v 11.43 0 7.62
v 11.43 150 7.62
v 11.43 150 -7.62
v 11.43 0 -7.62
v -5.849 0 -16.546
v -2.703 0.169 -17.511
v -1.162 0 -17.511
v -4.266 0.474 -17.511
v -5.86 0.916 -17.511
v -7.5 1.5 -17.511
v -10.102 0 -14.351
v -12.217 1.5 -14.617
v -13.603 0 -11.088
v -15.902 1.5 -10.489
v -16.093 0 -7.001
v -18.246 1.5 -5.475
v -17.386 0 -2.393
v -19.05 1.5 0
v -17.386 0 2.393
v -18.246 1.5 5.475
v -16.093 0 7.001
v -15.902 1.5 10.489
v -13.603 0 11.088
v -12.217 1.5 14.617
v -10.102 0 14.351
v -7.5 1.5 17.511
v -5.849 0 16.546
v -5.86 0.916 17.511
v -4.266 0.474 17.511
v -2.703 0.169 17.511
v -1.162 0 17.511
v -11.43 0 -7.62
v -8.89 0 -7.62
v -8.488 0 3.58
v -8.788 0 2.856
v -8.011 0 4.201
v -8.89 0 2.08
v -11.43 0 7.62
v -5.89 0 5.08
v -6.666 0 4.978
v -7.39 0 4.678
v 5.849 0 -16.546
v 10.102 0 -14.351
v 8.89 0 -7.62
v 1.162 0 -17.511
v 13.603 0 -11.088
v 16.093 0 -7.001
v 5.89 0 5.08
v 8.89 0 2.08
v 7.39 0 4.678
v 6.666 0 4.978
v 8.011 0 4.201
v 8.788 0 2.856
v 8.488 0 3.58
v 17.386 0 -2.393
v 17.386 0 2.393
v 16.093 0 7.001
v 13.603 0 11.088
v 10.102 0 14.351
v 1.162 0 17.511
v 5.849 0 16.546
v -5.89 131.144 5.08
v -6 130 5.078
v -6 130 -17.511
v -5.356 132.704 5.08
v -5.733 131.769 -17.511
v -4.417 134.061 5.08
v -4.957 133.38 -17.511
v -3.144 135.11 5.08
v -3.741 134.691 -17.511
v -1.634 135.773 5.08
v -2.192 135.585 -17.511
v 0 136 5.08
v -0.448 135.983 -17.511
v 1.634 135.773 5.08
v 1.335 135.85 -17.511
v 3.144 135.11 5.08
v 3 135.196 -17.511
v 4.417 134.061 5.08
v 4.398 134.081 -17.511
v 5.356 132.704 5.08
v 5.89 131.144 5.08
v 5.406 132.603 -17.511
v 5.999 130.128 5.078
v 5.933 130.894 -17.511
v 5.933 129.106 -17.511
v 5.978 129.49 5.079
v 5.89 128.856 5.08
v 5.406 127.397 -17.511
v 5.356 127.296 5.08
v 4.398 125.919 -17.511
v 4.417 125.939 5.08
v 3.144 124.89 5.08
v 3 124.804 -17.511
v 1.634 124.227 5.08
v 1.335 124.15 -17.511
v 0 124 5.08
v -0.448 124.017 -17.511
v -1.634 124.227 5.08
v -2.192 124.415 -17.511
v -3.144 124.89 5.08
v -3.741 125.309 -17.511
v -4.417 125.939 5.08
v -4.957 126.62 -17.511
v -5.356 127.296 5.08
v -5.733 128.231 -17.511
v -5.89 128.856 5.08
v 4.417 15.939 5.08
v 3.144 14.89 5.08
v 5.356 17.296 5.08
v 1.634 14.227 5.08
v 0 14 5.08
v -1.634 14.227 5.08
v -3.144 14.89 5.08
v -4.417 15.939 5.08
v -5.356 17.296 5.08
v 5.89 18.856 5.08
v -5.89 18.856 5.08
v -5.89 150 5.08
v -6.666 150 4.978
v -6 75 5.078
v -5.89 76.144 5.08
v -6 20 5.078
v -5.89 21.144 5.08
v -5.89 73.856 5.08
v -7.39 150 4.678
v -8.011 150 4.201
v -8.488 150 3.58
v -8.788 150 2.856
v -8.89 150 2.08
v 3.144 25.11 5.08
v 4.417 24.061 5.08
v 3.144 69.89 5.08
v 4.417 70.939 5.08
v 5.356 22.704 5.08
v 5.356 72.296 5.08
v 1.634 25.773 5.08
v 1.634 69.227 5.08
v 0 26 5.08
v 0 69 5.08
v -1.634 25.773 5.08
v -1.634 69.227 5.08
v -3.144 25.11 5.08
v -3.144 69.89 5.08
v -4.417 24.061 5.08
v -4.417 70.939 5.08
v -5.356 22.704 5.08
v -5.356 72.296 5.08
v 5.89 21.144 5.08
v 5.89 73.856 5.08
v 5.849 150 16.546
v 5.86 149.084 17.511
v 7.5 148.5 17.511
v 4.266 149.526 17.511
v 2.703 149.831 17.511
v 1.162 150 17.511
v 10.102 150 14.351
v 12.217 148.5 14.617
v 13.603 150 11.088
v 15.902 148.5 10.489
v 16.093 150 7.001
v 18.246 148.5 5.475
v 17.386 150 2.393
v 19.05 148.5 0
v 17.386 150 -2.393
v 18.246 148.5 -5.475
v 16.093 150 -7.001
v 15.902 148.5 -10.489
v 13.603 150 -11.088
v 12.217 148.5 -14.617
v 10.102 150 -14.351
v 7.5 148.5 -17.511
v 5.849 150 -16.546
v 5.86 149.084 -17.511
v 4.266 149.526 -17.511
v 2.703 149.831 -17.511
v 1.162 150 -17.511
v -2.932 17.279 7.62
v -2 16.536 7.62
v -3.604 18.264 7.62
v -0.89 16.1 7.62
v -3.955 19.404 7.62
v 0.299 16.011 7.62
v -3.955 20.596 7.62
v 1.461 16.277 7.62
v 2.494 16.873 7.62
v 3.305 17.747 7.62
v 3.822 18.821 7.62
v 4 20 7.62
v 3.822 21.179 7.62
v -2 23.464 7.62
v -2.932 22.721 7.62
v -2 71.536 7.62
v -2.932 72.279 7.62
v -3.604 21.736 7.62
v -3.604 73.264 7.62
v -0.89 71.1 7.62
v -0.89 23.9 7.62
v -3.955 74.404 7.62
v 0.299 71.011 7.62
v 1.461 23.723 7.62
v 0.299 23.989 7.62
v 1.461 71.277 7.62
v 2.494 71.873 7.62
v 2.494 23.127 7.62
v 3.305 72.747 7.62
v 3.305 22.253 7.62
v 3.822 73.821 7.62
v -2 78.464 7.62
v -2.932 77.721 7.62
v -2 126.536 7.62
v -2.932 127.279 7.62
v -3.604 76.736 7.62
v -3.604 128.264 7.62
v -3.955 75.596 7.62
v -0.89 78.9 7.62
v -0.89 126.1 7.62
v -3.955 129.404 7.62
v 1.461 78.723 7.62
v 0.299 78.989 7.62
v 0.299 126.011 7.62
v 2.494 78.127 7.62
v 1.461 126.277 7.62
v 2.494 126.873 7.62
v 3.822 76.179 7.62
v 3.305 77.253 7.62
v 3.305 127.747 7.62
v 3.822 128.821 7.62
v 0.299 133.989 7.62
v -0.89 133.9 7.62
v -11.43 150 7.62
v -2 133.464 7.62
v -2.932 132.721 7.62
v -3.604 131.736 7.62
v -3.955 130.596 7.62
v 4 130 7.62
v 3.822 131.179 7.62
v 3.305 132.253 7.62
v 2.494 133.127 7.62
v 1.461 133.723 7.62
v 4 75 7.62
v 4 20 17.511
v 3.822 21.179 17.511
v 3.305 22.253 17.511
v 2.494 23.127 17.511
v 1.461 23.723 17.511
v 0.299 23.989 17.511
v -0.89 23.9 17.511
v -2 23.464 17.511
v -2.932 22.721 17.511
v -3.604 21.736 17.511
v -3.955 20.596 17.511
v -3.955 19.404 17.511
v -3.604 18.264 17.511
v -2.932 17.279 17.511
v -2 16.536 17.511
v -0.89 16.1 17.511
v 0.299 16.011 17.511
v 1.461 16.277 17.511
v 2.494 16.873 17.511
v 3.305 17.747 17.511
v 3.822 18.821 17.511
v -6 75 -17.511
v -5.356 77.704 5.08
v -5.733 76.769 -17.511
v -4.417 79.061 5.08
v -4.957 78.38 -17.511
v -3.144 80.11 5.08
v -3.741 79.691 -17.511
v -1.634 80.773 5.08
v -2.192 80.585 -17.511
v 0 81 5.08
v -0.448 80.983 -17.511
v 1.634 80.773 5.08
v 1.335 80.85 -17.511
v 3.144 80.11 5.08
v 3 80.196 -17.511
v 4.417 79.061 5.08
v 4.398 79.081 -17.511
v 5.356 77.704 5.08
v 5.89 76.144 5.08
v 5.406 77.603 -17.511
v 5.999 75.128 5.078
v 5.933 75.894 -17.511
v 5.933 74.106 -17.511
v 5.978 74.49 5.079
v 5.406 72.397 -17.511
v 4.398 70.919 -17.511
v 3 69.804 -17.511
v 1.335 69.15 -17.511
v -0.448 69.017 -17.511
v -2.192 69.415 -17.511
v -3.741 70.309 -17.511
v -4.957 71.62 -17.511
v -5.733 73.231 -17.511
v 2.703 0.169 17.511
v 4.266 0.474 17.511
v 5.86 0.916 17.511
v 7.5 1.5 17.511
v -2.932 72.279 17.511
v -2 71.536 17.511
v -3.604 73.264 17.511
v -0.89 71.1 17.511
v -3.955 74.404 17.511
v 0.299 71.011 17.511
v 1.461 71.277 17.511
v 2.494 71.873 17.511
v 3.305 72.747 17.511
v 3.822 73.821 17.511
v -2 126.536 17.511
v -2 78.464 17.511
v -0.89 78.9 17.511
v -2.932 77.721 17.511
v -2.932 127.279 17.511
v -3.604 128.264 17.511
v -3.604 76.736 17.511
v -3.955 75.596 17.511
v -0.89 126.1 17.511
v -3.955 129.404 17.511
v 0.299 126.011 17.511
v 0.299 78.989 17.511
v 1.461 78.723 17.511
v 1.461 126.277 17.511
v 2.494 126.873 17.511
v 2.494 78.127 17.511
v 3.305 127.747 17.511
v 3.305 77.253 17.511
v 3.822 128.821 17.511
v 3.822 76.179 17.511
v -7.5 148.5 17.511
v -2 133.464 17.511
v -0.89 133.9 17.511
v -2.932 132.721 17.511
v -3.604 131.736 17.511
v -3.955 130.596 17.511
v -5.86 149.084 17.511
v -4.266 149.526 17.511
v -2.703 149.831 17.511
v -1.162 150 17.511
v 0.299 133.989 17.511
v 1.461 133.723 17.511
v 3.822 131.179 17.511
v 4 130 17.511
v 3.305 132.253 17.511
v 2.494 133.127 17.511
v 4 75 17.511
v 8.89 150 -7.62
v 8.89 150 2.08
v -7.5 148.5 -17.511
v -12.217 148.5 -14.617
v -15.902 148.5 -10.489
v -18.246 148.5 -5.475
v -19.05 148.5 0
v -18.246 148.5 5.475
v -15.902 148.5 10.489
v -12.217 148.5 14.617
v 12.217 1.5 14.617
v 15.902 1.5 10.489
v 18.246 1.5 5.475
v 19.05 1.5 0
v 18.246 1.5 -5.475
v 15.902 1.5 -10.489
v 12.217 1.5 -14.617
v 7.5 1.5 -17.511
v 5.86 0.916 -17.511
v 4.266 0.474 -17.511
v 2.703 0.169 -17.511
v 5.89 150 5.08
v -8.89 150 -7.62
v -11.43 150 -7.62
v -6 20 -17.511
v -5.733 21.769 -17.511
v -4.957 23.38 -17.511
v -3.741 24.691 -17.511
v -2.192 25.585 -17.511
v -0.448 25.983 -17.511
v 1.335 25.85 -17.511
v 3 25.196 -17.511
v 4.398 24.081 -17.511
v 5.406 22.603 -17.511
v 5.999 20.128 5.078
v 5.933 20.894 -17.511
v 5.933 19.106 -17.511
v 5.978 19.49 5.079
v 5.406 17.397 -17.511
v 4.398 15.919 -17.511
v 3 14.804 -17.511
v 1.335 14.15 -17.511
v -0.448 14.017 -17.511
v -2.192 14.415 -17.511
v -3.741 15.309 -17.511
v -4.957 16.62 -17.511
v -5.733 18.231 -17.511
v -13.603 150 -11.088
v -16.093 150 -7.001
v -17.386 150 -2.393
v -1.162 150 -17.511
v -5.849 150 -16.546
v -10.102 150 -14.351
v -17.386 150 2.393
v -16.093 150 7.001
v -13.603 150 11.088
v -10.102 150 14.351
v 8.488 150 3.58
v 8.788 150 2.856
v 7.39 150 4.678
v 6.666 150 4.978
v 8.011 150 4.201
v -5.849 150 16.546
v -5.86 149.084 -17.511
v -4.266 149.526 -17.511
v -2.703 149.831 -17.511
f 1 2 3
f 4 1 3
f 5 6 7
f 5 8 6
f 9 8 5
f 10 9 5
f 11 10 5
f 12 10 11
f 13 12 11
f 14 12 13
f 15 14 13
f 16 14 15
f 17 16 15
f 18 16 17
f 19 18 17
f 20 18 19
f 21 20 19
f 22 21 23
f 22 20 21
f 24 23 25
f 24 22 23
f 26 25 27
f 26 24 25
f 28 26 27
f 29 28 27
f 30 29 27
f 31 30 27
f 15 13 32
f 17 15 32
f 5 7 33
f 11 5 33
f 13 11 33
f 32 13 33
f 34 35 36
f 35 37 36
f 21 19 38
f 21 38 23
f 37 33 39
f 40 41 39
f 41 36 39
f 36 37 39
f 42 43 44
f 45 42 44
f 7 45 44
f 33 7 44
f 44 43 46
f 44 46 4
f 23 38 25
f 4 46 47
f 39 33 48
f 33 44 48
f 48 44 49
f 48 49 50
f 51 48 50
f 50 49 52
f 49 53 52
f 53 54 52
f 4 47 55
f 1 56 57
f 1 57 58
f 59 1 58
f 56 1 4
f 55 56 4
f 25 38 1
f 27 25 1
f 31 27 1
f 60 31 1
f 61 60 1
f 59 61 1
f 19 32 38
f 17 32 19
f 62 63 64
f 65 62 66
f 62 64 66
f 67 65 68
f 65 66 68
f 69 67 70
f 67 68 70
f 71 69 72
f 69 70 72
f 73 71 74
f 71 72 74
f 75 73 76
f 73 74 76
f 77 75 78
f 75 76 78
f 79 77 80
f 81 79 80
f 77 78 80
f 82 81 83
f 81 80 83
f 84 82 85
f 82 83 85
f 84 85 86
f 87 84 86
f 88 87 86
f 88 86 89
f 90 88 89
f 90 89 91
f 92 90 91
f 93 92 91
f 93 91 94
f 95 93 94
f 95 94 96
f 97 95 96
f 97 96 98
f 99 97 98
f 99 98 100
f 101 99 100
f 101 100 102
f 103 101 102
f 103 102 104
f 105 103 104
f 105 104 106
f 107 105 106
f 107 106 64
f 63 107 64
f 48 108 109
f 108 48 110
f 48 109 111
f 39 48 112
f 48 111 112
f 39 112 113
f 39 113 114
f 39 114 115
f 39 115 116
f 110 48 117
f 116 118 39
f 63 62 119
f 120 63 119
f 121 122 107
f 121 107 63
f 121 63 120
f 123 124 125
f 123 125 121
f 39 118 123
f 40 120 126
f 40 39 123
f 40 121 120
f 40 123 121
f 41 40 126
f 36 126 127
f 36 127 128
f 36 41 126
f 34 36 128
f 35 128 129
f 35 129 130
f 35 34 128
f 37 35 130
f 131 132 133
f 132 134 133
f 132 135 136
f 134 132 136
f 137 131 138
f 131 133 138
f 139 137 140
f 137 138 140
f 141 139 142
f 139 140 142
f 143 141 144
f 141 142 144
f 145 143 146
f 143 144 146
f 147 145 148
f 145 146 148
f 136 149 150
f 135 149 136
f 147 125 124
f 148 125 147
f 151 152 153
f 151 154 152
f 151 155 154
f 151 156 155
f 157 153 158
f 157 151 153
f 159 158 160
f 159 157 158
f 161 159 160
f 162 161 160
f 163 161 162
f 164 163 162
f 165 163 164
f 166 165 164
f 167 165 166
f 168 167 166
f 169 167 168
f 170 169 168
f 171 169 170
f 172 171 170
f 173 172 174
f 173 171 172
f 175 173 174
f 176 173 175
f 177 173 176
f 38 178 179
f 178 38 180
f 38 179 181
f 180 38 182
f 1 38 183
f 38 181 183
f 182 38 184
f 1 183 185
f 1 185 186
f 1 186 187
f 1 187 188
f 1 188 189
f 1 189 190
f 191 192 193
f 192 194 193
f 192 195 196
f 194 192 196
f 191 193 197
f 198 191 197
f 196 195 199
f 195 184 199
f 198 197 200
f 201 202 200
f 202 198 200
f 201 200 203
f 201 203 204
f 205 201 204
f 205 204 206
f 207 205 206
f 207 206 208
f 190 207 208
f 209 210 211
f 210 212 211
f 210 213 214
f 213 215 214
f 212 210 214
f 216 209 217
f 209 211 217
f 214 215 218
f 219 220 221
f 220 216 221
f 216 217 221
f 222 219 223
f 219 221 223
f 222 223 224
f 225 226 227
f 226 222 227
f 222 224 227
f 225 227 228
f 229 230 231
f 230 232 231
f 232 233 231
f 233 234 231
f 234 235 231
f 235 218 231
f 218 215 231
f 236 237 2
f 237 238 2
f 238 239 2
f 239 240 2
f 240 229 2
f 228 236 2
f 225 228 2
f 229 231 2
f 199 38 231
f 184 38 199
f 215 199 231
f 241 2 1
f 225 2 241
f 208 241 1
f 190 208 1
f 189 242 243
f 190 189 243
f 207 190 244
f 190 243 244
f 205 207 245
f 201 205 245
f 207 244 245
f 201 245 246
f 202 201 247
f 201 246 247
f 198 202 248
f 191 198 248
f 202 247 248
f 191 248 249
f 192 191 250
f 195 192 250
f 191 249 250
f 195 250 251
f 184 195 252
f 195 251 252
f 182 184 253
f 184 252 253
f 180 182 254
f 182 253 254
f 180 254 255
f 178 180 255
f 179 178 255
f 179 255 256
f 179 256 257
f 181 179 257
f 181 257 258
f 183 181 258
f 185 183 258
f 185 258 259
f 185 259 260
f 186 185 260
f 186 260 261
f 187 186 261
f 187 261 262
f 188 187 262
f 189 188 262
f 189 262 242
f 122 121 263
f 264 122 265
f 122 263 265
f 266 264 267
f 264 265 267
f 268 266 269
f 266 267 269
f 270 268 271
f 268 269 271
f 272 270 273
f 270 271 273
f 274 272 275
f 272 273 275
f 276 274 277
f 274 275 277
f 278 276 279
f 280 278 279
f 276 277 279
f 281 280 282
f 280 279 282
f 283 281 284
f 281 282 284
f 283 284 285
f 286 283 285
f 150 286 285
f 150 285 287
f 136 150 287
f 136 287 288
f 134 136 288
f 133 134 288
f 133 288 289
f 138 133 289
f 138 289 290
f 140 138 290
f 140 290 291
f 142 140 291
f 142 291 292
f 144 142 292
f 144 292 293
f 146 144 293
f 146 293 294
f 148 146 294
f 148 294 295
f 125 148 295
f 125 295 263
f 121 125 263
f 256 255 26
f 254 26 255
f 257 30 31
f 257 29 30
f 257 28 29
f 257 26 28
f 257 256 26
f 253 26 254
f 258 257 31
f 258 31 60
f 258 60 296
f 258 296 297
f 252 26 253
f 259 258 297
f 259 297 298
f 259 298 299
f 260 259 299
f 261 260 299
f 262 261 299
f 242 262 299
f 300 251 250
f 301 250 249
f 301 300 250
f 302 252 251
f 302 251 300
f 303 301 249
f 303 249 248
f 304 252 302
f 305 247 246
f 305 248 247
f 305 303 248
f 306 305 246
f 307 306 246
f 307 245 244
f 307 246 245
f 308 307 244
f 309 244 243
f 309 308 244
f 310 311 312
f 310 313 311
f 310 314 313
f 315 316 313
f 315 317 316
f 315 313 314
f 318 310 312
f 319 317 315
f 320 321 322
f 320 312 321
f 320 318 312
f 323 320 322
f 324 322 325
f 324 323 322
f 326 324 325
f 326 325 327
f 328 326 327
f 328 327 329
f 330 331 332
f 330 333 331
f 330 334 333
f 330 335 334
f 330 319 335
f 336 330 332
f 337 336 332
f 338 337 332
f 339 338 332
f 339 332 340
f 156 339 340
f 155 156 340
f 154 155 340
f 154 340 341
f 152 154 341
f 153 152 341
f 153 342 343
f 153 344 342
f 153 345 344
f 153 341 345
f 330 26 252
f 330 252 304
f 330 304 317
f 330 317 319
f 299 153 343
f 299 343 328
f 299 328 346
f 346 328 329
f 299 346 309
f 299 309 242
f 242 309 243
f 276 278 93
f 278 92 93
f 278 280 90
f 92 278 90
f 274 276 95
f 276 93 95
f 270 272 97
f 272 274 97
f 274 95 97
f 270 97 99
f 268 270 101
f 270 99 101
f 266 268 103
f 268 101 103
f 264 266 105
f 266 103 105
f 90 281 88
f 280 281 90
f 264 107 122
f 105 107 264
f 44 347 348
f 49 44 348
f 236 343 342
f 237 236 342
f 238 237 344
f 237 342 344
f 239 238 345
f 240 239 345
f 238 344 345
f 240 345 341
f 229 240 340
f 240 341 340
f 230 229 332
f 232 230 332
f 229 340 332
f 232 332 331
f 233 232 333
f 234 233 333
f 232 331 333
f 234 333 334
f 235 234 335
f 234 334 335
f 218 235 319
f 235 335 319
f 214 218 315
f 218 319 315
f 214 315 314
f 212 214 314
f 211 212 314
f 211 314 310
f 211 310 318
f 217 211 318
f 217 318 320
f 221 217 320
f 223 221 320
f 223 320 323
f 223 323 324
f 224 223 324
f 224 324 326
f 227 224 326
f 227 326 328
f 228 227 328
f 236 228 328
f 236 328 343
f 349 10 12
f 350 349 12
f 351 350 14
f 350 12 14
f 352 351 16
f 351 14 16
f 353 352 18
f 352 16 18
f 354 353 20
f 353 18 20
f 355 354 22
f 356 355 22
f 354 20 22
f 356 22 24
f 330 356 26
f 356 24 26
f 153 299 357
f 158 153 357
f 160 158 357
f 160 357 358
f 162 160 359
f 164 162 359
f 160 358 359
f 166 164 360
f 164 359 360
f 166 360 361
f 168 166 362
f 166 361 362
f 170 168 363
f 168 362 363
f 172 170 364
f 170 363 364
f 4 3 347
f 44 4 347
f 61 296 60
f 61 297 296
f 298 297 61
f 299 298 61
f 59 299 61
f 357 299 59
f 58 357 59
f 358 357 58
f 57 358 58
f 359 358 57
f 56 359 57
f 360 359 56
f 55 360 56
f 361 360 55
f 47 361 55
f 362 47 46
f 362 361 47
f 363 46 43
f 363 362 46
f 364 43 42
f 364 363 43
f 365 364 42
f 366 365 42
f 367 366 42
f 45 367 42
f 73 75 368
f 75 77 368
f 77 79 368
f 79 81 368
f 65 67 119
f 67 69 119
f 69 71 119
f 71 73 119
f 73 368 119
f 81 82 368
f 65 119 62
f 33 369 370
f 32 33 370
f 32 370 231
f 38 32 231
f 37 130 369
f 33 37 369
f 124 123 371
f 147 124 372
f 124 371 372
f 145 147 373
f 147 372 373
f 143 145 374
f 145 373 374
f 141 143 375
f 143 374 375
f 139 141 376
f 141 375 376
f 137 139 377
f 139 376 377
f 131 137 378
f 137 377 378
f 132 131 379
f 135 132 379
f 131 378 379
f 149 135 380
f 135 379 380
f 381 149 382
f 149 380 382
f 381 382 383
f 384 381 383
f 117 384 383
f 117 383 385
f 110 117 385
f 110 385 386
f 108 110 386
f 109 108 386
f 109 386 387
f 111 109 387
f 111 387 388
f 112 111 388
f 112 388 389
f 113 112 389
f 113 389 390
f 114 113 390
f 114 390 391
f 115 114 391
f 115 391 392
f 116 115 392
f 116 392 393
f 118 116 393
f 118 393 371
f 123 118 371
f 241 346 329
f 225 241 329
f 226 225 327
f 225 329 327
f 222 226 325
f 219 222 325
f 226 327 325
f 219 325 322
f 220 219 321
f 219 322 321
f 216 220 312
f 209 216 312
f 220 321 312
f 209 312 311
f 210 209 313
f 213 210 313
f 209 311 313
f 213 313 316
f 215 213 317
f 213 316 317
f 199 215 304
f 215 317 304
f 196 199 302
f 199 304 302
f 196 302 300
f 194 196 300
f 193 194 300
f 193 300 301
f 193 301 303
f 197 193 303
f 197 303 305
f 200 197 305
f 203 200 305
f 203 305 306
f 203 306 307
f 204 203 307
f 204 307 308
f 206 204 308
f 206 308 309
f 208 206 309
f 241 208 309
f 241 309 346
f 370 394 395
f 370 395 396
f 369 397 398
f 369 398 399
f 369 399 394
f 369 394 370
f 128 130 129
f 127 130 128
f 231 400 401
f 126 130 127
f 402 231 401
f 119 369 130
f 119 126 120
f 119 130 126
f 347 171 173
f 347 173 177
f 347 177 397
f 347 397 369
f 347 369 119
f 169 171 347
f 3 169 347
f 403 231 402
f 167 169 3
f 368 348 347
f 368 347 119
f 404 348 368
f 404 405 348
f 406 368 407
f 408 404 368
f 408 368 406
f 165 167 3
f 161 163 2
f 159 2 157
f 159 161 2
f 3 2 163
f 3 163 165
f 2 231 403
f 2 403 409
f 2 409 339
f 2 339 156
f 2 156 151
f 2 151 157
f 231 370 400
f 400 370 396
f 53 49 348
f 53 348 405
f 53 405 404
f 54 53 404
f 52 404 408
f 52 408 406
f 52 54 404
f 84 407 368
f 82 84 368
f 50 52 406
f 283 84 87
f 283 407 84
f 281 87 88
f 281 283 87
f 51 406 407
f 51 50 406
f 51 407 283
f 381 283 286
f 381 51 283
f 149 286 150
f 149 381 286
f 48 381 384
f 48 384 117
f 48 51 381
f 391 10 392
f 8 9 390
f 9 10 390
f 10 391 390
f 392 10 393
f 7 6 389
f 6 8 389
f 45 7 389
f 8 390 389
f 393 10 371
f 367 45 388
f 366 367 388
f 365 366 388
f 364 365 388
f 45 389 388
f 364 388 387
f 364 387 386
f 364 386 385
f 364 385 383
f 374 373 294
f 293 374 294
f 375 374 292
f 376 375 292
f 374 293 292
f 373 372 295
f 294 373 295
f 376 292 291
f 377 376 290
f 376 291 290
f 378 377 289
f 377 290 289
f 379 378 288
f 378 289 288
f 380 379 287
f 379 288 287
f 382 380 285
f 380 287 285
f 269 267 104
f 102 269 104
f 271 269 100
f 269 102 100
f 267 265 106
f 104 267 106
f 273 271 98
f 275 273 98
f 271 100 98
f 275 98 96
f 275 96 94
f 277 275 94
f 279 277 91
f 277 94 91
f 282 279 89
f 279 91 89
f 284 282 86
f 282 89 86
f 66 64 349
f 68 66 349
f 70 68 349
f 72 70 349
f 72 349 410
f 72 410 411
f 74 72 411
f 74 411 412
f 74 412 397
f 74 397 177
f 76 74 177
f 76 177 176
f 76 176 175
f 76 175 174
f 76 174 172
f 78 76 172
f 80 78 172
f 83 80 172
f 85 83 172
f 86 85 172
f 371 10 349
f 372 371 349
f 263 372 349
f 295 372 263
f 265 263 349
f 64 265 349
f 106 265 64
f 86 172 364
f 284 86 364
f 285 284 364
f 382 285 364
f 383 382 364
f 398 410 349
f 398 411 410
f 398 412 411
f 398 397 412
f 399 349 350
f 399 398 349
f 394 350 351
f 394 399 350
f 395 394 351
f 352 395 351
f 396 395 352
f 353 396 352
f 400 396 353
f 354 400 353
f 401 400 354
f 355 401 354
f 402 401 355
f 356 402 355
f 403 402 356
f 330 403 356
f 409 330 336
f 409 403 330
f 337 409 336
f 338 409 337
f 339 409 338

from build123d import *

# Parameters (mm, degrees)
SKETCH1_R             = 19.05
BOSS_EXTRUDE1_DEPTH   = 150
CUT_EXTRUDE1_DEPTH    = 153.400147638
FILLET1_R             = 3
CUT_EXTRUDE2_DEPTH    = 153.400147638
CHAMFER1_SIZE         = 1.5
F_8_0MM_DOWEL_HOLE1_D = 8
CUT_EXTRUDE3_REACH    = 157.208
SKETCH6_R             = 6


with BuildPart() as part:
    # Sketch1 → Boss-Extrude1 (new body)
    with BuildSketch(Plane(origin=(0, 0, 0), x_dir=(1, 0, 0), z_dir=(0, 1, 0))):
        with Locations(Location((0, 0, 0), (0, 0, 270))):
            Circle(SKETCH1_R)
    extrude(amount=BOSS_EXTRUDE1_DEPTH)

    # Sketch2 → Cut-Extrude1 (cut, through all)
    with BuildSketch(Plane(origin=(0, 150, 0), x_dir=(1, 0, 0), z_dir=(0, 1, 0))):
        Polygon((-11.43, -7.62), (11.43, -7.62), (11.43, 7.62), (8.89, 7.62), (8.89, -5.08), (-8.89, -5.08), (-8.89, 7.62), (-11.43, 7.62), align=None)
    extrude(amount=-CUT_EXTRUDE1_DEPTH, mode=Mode.SUBTRACT)

    # Fillet1
    fillet1_edges = [part.edges().sort_by_distance(p)[0] for p in [
        (-8.89, 75, 5.08),
        (8.89, 75, 5.08),
    ]]
    fillet(fillet1_edges, radius=FILLET1_R)

    # Sketch3 → Cut-Extrude2 (cut, through all)
    with BuildSketch(Plane(origin=(0, 150, 0), x_dir=(1, 0, 0), z_dir=(0, 1, 0))):
        with BuildLine():
            Line((-7.5, 17.511496224), (7.5, 17.511496224))
            ThreePointArc((7.5, 17.511496224), (0, 19.05), (-7.5, 17.511496224))
        make_face()
        with BuildLine():
            Line((-7.5, -17.511496224), (7.5, -17.511496224))
            ThreePointArc((7.5, -17.511496224), (0, -19.05), (-7.5, -17.511496224))
        make_face()
    extrude(amount=-CUT_EXTRUDE2_DEPTH, mode=Mode.SUBTRACT)

    # Chamfer1
    chamfer1_edges = [part.edges().sort_by_distance(p)[0] for p in [
        (19.05, 0, 0),
        (-19.05, 0, 0),
        (-19.05, 150, 0),
        (19.05, 150, 0),
    ]]
    chamfer(chamfer1_edges, length=CHAMFER1_SIZE)

    # Ø8.0mm Dowel Hole1 (through all)
    with Locations(Plane(origin=(0, 0, -17.511496224), x_dir=(-1, 0, 0), z_dir=(0, 0, -1))):
        with Locations((0, 130), (0, 75), (0, 20)):
            Hole(F_8_0MM_DOWEL_HOLE1_D / 2)

    # Cut-Extrude3: up to this face of the body (flat: up to its plane)
    cut_extrude3_end = Plane(part.part.faces().sort_by_distance((0, 148.482680666, 7.62))[0])
    # Sketch6 → Cut-Extrude3 (cut, up to the picked face)
    with BuildSketch(Plane(origin=(0, 0, -17.511496224), x_dir=(-1, 0, 0), z_dir=(0, 0, -1)), mode=Mode.PRIVATE) as cut_extrude3_sk1:
        with Locations((0, 130)):
            Circle(SKETCH6_R)
    cut_extrude3_tool1 = split(extrude(cut_extrude3_sk1.sketch, amount=-CUT_EXTRUDE3_REACH, mode=Mode.PRIVATE), bisect_by=cut_extrude3_end, keep=Keep.BOTH, mode=Mode.PRIVATE)
    # Sketch6 → Cut-Extrude3 (cut, up to the picked face)
    with BuildSketch(Plane(origin=(0, 0, -17.511496224), x_dir=(-1, 0, 0), z_dir=(0, 0, -1)), mode=Mode.PRIVATE) as cut_extrude3_sk2:
        with Locations((0, 75)):
            Circle(SKETCH6_R)
    cut_extrude3_tool2 = split(extrude(cut_extrude3_sk2.sketch, amount=-CUT_EXTRUDE3_REACH, mode=Mode.PRIVATE), bisect_by=cut_extrude3_end, keep=Keep.BOTH, mode=Mode.PRIVATE)
    # Sketch6 → Cut-Extrude3 (cut, up to the picked face)
    with BuildSketch(Plane(origin=(0, 0, -17.511496224), x_dir=(-1, 0, 0), z_dir=(0, 0, -1)), mode=Mode.PRIVATE) as cut_extrude3_sk3:
        with Locations((0, 20)):
            Circle(SKETCH6_R)
    cut_extrude3_tool3 = split(extrude(cut_extrude3_sk3.sketch, amount=-CUT_EXTRUDE3_REACH, mode=Mode.PRIVATE), bisect_by=cut_extrude3_end, keep=Keep.BOTH, mode=Mode.PRIVATE)
    add(cut_extrude3_tool1.solids().sort_by(Axis((0, 130, -17.511496), (0, 0, 1)))[0], mode=Mode.SUBTRACT)
    add(cut_extrude3_tool2.solids().sort_by(Axis((0, 75, -17.511496), (0, 0, 1)))[0], mode=Mode.SUBTRACT)
    add(cut_extrude3_tool3.solids().sort_by(Axis((0, 20, -17.511496), (0, 0, 1)))[0], mode=Mode.SUBTRACT)


solid = part.part
